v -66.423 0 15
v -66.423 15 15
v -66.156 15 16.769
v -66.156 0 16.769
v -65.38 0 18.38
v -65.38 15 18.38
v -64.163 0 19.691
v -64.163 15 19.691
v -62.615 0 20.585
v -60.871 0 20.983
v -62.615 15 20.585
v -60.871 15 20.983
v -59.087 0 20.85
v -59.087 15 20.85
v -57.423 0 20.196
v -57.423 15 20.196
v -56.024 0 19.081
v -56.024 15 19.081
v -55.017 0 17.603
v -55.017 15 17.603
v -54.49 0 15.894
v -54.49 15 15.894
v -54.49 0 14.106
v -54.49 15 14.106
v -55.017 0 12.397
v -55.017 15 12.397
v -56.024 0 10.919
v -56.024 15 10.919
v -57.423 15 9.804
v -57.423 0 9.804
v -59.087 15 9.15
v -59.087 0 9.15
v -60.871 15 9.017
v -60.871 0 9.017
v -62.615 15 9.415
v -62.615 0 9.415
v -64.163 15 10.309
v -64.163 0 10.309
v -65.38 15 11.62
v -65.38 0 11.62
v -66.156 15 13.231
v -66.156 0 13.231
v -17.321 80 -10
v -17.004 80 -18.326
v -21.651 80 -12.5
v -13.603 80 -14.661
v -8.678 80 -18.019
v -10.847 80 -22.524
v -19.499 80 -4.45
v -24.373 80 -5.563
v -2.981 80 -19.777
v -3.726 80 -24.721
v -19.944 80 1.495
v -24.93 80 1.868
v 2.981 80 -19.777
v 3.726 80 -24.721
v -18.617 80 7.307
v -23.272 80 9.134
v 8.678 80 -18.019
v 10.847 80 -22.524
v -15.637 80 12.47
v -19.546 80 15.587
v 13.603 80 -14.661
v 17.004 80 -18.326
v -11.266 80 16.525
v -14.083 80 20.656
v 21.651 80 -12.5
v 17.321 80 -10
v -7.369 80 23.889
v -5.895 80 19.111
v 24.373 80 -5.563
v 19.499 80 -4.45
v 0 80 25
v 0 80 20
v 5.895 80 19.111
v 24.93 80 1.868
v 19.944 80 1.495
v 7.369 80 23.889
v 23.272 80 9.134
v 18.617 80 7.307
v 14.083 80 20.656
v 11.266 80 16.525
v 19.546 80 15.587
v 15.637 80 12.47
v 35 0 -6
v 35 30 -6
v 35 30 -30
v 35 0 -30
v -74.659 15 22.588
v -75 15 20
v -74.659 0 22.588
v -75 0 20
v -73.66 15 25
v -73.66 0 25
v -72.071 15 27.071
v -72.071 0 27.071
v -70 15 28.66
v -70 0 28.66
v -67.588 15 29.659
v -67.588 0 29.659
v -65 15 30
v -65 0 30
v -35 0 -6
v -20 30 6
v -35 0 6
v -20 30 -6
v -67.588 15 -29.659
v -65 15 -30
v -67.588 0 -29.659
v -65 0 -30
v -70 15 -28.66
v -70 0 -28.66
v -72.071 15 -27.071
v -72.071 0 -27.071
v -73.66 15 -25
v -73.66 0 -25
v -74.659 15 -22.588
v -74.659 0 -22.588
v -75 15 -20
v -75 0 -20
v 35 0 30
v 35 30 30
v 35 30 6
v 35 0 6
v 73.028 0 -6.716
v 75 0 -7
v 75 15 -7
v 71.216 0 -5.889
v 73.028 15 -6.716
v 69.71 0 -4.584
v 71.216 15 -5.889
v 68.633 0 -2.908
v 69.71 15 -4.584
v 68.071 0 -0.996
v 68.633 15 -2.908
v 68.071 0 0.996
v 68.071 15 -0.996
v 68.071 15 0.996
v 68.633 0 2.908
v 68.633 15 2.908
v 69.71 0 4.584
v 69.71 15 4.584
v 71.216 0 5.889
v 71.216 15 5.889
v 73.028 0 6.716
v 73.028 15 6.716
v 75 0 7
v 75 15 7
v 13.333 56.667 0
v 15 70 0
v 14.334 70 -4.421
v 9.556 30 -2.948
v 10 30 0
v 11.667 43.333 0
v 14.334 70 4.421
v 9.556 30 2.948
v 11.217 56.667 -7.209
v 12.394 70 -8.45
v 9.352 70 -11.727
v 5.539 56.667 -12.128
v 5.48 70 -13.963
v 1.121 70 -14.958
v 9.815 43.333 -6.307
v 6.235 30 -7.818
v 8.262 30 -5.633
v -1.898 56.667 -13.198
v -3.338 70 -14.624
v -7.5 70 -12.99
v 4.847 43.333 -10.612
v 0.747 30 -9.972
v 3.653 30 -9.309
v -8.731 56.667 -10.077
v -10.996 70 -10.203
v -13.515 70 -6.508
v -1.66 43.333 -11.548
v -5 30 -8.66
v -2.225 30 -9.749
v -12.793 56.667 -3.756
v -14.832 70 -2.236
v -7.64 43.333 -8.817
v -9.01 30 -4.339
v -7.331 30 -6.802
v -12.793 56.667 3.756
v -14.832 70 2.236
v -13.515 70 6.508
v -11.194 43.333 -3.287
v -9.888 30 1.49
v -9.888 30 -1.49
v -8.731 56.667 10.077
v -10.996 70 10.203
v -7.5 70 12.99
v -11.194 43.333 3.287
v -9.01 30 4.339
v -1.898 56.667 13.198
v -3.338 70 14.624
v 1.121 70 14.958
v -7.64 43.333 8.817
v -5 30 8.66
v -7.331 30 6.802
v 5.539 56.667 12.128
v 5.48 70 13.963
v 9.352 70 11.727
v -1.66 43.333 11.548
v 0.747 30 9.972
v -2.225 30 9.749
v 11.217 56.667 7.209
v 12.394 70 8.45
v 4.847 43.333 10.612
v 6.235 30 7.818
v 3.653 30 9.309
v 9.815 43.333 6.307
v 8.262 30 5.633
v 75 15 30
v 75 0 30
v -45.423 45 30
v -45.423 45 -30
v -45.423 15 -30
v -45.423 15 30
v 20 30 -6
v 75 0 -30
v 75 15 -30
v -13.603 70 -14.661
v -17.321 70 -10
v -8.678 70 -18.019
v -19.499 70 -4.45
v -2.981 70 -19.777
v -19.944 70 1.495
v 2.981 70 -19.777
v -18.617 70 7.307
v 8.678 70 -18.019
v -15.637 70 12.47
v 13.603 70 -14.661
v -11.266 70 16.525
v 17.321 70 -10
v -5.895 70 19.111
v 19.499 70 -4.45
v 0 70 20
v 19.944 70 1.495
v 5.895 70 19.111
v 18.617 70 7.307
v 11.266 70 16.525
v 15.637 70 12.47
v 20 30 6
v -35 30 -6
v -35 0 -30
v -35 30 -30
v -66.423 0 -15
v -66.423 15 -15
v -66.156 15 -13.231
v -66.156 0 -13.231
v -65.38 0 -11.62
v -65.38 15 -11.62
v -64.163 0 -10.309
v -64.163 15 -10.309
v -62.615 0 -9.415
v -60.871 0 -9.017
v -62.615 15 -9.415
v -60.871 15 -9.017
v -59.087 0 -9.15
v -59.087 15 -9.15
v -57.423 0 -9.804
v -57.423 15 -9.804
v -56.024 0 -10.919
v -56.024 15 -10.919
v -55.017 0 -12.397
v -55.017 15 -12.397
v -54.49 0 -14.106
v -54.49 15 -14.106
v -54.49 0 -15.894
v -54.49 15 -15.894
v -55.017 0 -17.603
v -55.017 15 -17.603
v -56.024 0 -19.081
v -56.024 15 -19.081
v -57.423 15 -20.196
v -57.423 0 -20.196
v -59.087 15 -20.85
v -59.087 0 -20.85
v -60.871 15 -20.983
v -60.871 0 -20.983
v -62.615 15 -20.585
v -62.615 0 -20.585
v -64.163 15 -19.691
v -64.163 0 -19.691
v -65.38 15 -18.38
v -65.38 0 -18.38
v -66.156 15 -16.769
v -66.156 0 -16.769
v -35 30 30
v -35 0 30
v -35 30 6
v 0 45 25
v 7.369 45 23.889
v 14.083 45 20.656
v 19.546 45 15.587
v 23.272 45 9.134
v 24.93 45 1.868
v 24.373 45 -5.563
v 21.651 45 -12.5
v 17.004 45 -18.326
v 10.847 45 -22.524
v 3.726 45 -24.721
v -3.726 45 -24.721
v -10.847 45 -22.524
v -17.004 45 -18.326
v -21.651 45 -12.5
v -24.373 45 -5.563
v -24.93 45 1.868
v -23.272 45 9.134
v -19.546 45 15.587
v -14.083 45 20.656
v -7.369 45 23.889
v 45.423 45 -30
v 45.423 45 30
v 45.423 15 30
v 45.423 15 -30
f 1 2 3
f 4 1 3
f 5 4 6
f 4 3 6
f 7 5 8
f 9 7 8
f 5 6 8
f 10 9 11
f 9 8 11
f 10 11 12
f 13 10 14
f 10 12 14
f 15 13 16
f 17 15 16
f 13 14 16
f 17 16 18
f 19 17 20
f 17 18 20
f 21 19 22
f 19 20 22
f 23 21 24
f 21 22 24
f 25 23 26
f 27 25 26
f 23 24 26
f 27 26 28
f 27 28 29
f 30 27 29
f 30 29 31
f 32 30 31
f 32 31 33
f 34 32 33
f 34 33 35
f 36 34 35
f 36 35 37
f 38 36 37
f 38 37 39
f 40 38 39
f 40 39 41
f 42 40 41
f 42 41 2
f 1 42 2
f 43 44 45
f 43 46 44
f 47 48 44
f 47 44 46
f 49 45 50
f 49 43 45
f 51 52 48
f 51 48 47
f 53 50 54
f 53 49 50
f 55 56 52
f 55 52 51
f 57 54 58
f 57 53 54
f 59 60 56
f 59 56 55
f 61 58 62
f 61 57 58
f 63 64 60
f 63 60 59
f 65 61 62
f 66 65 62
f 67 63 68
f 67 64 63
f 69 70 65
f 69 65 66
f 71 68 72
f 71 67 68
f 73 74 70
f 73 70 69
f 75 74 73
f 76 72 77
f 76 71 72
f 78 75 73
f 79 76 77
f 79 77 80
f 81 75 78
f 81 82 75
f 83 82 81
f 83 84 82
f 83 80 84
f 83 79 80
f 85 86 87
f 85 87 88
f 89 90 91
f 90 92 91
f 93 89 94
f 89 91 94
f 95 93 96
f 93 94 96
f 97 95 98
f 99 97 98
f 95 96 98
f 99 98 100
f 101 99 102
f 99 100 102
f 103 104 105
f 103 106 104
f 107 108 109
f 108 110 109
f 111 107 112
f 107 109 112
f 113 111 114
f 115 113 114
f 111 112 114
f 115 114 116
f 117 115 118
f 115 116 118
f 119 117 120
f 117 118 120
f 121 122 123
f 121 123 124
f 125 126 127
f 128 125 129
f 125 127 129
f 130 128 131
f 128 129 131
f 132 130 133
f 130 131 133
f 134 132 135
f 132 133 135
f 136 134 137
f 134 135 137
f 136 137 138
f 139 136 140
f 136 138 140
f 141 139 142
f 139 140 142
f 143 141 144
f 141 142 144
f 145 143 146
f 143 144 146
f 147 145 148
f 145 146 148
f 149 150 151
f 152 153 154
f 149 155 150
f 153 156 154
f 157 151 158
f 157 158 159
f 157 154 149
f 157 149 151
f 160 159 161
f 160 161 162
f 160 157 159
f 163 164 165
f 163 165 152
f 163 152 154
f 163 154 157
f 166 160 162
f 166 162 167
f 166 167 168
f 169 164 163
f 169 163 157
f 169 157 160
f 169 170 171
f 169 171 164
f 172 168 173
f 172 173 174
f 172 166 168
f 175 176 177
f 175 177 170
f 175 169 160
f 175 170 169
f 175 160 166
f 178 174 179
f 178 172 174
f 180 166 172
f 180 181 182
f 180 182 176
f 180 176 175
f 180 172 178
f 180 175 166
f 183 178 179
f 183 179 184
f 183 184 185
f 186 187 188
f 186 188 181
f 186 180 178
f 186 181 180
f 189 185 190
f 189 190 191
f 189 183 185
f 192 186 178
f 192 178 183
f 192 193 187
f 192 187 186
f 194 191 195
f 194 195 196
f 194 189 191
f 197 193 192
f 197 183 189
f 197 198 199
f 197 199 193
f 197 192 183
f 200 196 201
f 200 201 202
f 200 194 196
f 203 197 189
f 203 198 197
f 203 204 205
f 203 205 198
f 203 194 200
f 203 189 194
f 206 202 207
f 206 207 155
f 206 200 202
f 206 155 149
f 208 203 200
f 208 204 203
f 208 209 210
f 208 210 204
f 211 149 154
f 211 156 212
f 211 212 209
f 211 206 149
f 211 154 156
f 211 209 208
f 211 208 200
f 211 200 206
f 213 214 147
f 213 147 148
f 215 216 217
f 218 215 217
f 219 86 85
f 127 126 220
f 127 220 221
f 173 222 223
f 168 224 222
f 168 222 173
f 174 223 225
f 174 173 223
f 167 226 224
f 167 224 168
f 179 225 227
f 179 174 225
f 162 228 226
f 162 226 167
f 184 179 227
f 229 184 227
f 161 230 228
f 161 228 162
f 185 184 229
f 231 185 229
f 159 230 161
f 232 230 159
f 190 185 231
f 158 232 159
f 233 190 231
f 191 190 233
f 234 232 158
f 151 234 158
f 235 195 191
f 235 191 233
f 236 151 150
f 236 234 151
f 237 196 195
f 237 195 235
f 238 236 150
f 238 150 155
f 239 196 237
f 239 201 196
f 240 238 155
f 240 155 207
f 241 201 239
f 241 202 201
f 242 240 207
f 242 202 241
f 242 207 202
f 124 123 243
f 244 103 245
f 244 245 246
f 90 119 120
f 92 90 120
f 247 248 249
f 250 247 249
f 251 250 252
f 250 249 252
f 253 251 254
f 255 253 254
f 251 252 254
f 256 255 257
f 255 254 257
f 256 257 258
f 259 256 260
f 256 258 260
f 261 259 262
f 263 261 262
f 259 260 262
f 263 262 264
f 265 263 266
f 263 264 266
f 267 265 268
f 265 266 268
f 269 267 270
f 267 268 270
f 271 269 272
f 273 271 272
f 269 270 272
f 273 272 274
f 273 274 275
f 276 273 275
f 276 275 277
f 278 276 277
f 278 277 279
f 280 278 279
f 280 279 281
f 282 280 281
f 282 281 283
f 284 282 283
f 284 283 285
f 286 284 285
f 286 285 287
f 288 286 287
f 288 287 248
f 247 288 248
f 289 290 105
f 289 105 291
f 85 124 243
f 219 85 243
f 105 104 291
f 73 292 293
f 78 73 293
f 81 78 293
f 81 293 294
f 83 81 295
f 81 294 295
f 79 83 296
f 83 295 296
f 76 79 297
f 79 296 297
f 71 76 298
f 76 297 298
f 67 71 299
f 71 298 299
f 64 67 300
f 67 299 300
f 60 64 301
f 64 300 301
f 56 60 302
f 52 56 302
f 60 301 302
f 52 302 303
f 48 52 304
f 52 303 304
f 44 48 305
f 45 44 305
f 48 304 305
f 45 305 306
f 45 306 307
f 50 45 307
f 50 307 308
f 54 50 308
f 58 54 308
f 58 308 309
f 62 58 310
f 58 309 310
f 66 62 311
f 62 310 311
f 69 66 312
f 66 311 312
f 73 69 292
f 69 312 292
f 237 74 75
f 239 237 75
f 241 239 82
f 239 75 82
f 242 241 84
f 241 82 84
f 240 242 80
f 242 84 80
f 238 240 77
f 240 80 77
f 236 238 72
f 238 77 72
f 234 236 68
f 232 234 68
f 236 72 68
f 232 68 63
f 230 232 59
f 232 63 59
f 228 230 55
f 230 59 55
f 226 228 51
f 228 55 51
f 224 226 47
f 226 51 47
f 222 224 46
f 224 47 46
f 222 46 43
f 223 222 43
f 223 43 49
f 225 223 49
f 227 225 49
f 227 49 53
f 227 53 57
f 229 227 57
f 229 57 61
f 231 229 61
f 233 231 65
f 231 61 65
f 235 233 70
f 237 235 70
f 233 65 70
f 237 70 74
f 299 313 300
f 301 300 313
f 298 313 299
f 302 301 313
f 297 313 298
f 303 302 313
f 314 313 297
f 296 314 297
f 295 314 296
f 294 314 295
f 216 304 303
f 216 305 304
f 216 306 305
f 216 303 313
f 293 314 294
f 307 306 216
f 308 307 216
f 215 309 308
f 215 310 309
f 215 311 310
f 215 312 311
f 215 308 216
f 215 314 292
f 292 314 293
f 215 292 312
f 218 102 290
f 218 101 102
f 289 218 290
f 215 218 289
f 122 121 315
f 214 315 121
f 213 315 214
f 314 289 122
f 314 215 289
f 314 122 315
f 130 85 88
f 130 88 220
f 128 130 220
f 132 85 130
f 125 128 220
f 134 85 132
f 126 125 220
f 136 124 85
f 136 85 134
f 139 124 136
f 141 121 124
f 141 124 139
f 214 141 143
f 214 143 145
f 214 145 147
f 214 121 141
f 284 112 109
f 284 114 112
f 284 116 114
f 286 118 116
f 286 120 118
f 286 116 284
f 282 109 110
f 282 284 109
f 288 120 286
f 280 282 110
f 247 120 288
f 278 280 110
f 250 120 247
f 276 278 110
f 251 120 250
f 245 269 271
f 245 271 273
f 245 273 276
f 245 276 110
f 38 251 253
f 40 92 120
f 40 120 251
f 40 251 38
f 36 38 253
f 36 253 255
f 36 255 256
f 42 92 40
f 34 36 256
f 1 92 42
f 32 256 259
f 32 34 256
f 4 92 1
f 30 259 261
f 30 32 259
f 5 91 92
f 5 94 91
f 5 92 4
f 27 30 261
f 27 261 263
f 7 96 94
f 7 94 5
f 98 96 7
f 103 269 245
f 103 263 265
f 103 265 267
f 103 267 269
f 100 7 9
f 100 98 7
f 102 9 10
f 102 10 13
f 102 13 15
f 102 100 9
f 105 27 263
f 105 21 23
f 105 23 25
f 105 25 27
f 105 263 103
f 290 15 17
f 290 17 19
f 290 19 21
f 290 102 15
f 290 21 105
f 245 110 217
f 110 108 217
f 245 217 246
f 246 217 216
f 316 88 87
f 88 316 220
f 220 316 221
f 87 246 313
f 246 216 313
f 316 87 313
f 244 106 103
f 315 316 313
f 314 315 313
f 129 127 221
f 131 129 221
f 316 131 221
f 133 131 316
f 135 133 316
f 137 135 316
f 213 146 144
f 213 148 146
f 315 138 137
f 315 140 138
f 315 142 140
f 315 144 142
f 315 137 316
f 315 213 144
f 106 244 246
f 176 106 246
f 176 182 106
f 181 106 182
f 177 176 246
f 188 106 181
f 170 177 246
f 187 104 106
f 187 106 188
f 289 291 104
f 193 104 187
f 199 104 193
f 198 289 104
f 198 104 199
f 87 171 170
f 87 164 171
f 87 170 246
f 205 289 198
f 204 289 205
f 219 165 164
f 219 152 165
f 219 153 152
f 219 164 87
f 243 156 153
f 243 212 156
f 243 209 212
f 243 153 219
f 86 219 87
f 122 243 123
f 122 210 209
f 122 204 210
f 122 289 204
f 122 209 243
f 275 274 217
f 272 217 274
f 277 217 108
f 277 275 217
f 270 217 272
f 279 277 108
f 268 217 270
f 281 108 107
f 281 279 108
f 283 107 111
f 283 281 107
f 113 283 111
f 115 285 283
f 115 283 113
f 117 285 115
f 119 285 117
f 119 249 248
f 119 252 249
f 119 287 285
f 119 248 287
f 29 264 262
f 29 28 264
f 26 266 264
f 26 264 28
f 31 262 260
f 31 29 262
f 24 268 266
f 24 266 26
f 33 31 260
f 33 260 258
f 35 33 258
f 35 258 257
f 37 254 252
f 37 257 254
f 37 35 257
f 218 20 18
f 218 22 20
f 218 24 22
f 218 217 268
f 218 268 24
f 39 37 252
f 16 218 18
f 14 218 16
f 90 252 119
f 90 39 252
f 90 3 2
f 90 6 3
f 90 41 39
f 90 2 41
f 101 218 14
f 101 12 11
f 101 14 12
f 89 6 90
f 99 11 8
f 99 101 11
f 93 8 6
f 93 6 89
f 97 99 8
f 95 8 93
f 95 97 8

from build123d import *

# Parameters (mm, degrees)
BOSS_EXTRUDE1_DEPTH = 30
BOSS_EXTRUDE2_DEPTH = 6
SKETCH3_R           = 6
CUT_EXTRUDE1_DEPTH  = 87.168439698
FILLET1_R           = 10
SKETCH4_R           = 7
CUT_EXTRUDE2_DEPTH  = 22
SKETCH5_R           = 25
BOSS_EXTRUDE3_DEPTH = 35
SKETCH6_R           = 20
CUT_EXTRUDE3_DEPTH  = 10
SKETCH7_R           = 15
SKETCH8_R           = 10


with BuildPart() as part:
    # Sketch1 → Boss-Extrude1 (new, symmetric)
    with BuildSketch(Plane.XY):
        Polygon((-75, 0), (-35, 0), (-35, 30), (35, 30), (35, 0), (75, 0), (75, 15), (45.422535211, 15), (45.422535211, 45), (-45.422535211, 45), (-45.422535211, 15), (-75, 15), align=None)
    extrude(amount=BOSS_EXTRUDE1_DEPTH, both=True)

    # Sketch2 → Boss-Extrude2 (add, symmetric)
    with BuildSketch(Plane.XY):
        Polygon((-35, 0), (-35, 30), (-20, 30), align=None)
        Polygon((20, 30), (35, 30), (35, 0), align=None)
    extrude(amount=BOSS_EXTRUDE2_DEPTH, both=True)

    # Sketch3 → Cut-Extrude1 (cut, through all)
    with BuildSketch(Plane(origin=(0, 15, 0), x_dir=(1, 0, 0), z_dir=(0, 1, 0))):
        with Locations(Location((-60.422535211, -15, 0), (0, 0, 180))):
            Circle(SKETCH3_R)
        with Locations(Location((-60.422535211, 15, 0), (0, 0, 180))):
            Circle(SKETCH3_R)
    extrude(amount=-CUT_EXTRUDE1_DEPTH, mode=Mode.SUBTRACT)

    # Fillet1
    fillet1_edges = [part.edges().sort_by_distance(p)[0] for p in [
        (-75, 7.5, -30),
        (-75, 7.5, 30),
    ]]
    fillet(fillet1_edges, radius=FILLET1_R)

    # Sketch4 → Cut-Extrude2 (cut)
    with BuildSketch(Plane(origin=(0, 15, 0), x_dir=(1, 0, 0), z_dir=(0, 1, 0))):
        with Locations((75, 0)):
            Circle(SKETCH4_R)
    extrude(amount=-CUT_EXTRUDE2_DEPTH, mode=Mode.SUBTRACT)

    # Sketch5 → Boss-Extrude3 (add)
    with BuildSketch(Plane(origin=(0, 45, 0), x_dir=(1, 0, 0), z_dir=(0, 1, 0))):
        with Locations(Location((0, 0, 0), (0, 0, 270))):
            Circle(SKETCH5_R)
    extrude(amount=BOSS_EXTRUDE3_DEPTH)

    # Sketch6 → Cut-Extrude3 (cut)
    with BuildSketch(Plane(origin=(0, 80, 0), x_dir=(1, 0, 0), z_dir=(0, 1, 0))):
        with Locations(Location((0, 0, 0), (0, 0, 270))):
            Circle(SKETCH6_R)
    extrude(amount=-CUT_EXTRUDE3_DEPTH, mode=Mode.SUBTRACT)

    # Sketch7 → Cut-Loft1 section 0
    with BuildSketch(Plane(origin=(0, 70, 0), x_dir=(1, 0, 0), z_dir=(0, 1, 0))):
        Circle(SKETCH7_R)
    # Sketch8 → Cut-Loft1 section 1
    with BuildSketch(Plane.XZ.offset(-30)):
        Circle(SKETCH8_R)
    loft(mode=Mode.SUBTRACT)


solid = part.part
